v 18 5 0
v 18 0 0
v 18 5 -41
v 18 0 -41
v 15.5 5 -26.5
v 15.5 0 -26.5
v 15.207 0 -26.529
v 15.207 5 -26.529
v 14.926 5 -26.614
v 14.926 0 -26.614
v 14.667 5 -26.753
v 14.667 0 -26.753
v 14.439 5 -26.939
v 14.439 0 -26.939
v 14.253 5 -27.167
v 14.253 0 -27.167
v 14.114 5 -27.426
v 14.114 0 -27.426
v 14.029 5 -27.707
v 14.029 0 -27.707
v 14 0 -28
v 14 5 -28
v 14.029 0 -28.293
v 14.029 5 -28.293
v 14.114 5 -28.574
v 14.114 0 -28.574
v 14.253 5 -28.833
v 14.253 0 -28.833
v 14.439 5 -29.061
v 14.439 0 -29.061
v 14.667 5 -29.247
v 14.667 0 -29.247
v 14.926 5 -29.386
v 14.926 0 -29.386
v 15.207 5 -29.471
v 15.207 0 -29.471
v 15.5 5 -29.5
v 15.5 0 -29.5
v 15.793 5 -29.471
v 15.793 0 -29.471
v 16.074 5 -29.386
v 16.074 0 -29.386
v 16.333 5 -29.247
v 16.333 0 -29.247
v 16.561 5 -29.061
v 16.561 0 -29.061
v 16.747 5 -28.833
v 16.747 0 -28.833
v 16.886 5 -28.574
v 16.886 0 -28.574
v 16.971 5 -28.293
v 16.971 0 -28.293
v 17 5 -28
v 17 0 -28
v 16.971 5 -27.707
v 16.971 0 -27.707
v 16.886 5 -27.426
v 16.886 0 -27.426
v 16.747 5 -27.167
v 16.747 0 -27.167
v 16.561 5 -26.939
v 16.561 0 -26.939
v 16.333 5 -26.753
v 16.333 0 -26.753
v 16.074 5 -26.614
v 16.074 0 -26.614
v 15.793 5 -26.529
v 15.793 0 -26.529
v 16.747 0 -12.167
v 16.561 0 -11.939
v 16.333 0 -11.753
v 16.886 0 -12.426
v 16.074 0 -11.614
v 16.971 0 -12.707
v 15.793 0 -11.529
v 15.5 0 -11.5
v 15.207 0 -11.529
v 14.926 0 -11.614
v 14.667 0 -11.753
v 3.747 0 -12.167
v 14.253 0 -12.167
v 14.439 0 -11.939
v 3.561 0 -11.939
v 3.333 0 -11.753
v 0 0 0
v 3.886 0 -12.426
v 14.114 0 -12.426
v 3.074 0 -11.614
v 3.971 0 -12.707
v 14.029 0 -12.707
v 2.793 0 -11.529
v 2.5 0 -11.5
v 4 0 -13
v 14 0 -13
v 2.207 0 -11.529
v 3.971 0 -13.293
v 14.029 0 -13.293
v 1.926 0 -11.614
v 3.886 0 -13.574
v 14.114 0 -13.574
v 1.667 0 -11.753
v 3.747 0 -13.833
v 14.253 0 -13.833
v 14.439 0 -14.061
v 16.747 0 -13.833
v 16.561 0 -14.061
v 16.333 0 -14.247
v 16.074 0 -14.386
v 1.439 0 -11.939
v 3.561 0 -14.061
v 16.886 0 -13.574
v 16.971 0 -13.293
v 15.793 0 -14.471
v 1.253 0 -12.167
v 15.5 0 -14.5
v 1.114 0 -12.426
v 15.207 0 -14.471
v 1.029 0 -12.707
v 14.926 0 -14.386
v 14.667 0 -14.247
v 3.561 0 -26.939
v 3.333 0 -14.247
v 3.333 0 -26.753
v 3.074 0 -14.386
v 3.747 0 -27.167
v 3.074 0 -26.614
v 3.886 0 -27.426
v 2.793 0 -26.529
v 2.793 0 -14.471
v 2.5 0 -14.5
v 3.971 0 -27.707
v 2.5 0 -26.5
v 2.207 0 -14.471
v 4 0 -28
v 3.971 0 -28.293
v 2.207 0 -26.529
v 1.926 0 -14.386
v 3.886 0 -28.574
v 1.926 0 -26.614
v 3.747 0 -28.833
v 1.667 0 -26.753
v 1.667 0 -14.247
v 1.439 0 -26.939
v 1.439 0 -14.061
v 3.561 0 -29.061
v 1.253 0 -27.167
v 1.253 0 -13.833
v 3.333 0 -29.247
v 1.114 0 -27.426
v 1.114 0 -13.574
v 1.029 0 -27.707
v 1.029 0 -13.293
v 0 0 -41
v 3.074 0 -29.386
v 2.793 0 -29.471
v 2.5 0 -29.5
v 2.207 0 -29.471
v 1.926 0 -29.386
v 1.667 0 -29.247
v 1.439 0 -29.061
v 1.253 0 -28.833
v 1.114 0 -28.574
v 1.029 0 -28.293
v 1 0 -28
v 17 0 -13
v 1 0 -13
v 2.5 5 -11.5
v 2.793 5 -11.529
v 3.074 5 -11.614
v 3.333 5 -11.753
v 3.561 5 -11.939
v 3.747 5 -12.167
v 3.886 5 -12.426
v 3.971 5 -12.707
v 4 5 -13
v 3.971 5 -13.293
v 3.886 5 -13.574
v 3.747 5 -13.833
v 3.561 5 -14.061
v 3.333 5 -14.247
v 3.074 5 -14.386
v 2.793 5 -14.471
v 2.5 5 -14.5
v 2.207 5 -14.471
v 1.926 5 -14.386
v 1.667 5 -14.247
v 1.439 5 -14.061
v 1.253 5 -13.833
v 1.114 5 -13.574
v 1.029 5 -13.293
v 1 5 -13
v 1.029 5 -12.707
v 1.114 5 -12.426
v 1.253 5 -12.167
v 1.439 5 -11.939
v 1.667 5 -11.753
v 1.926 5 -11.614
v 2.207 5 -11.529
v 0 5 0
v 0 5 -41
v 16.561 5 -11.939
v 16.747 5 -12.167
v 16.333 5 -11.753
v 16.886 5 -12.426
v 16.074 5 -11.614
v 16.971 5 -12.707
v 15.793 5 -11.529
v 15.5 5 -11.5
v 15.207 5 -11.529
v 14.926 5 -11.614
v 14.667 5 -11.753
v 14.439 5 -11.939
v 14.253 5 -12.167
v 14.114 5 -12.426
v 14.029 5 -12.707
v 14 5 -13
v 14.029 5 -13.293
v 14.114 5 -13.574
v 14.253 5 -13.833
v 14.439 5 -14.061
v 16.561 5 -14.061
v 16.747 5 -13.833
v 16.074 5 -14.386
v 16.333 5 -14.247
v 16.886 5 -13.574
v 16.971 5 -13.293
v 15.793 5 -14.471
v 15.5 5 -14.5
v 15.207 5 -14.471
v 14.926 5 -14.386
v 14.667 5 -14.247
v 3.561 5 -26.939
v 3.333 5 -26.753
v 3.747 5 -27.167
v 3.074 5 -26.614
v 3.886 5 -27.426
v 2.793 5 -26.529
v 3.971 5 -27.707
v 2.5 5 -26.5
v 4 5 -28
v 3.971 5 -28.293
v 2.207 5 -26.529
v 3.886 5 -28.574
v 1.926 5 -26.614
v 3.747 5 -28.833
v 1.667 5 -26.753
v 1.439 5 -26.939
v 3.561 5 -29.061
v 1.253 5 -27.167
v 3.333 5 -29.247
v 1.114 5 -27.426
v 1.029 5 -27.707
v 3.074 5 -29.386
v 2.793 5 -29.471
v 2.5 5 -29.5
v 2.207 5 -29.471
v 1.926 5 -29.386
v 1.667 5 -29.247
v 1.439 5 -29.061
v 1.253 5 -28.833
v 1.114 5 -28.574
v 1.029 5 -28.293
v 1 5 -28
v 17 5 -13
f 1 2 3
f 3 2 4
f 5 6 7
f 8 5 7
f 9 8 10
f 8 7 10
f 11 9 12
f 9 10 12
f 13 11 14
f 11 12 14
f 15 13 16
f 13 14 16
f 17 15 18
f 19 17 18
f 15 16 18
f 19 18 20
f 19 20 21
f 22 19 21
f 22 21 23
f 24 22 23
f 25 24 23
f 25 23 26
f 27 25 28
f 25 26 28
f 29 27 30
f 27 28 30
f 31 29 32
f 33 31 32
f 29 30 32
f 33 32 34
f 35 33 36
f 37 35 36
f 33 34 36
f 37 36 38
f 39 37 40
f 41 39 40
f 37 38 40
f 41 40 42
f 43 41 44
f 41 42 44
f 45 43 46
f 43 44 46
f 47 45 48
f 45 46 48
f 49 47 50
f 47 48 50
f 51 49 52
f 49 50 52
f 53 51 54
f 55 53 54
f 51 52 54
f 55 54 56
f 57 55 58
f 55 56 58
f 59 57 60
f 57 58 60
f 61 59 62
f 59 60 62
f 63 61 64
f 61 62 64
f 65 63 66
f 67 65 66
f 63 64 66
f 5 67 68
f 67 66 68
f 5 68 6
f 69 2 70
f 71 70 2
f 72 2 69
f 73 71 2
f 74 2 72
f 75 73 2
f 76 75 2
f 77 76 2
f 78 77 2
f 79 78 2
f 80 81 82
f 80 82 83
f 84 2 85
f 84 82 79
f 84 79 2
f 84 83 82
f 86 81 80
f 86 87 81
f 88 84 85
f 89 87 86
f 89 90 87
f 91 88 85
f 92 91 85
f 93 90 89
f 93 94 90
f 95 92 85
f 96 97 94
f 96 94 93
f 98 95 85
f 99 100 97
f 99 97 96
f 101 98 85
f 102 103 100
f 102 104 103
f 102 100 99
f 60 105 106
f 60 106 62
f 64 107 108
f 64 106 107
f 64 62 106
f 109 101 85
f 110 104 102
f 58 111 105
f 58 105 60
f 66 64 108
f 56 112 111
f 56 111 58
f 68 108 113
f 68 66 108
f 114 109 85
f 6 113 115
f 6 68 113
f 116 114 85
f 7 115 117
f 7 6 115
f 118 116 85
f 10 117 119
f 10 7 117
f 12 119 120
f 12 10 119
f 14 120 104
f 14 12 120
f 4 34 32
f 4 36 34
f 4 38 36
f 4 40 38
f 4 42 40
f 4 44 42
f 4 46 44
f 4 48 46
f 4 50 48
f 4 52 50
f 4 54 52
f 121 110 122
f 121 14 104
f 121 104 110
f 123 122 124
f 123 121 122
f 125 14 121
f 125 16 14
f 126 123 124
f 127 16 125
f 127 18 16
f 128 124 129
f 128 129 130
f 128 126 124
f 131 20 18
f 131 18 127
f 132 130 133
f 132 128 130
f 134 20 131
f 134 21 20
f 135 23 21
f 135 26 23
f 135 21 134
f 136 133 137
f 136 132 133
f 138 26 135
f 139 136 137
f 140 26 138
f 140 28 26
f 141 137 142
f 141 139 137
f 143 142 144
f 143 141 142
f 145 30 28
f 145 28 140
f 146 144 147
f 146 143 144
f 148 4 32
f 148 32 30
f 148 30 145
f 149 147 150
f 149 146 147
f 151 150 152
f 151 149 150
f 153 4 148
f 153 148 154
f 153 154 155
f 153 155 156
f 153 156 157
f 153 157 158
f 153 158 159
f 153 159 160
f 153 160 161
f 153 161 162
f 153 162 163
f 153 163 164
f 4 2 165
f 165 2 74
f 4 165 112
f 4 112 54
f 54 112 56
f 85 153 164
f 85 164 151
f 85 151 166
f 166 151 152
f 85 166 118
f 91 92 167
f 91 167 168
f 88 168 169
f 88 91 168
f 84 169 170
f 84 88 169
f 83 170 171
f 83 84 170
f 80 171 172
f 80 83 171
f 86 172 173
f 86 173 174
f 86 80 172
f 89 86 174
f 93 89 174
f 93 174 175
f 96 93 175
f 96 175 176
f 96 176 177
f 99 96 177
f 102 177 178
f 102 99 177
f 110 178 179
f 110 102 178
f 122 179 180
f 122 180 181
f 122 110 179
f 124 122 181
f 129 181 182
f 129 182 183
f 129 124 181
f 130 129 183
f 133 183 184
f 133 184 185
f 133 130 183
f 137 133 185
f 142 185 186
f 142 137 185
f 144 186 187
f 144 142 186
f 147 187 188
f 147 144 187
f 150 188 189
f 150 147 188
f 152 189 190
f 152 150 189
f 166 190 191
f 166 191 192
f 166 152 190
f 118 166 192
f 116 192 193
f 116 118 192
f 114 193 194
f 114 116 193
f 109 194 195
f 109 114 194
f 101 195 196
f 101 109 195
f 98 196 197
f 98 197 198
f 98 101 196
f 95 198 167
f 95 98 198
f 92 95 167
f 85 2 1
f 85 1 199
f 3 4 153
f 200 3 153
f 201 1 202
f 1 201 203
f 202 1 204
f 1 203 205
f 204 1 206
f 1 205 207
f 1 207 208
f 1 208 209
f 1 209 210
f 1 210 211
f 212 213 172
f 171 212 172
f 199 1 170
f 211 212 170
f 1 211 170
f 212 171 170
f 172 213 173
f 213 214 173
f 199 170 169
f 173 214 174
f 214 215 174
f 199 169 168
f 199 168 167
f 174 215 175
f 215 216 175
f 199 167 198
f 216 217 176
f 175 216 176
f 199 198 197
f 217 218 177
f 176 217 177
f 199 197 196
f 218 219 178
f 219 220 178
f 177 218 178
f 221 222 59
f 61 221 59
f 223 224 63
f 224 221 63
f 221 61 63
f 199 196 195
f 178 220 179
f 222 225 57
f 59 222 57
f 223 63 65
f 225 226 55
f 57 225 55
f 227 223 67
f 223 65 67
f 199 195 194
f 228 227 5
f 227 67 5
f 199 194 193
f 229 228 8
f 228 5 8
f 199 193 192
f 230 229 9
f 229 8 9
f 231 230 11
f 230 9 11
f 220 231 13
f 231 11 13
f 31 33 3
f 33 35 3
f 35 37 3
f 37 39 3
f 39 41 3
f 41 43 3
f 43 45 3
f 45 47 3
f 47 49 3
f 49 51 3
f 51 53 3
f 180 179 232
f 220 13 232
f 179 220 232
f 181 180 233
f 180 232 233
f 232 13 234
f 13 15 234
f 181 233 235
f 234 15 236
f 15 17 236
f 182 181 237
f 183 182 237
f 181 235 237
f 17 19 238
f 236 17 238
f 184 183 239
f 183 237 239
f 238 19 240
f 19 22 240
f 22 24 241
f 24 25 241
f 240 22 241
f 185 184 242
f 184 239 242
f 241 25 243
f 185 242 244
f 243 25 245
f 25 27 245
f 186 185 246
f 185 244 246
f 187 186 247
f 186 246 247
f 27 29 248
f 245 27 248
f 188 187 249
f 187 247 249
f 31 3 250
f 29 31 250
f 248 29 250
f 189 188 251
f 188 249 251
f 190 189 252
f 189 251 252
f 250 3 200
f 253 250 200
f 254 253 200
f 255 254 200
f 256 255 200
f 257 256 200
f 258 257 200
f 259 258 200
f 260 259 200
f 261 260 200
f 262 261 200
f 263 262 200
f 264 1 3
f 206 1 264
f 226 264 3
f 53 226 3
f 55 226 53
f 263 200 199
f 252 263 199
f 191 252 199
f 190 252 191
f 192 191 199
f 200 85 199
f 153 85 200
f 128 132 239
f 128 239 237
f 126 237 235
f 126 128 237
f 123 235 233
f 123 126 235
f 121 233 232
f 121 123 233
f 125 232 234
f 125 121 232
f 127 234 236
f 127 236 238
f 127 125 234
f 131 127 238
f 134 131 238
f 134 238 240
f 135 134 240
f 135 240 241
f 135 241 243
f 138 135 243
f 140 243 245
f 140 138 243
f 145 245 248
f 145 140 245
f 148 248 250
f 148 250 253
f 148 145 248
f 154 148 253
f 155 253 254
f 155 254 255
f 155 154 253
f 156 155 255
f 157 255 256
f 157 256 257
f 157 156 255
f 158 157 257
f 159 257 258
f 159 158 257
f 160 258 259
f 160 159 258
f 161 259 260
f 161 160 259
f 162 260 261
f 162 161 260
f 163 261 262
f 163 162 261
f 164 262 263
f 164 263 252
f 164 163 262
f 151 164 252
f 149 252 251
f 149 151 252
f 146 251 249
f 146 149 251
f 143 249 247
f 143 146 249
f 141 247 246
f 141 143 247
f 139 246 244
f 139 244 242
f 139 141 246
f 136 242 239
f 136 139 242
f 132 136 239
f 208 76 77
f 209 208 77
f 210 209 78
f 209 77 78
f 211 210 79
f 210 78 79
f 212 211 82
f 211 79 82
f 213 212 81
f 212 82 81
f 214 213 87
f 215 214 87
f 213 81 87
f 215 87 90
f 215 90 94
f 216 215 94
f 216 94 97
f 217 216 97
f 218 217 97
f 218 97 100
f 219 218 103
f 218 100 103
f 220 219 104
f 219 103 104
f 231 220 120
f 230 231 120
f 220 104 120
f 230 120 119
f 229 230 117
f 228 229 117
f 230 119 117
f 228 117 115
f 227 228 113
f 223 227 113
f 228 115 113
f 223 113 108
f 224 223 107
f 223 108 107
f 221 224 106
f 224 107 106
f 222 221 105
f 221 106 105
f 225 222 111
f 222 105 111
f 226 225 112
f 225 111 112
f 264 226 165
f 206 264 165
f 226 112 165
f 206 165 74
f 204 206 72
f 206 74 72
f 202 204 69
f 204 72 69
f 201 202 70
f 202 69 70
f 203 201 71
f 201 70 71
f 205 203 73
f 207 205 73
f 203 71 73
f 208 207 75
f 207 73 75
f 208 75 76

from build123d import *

# Parameters (mm, degrees)
SKETCH1_W           = 9
SKETCH1_H           = 41
SKETCH1_R           = 1.5
BOSS_EXTRUDE1_DEPTH = 5


with BuildPart() as part:
    # Sketch1 → Boss-Extrude1 (new body)
    with BuildSketch(Plane(origin=(0, 0, 0), x_dir=(1, 0, 0), z_dir=(0, 1, 0))):
        with Locations((4.5, 20.5)):
            Rectangle(SKETCH1_W, SKETCH1_H)
        with Locations(Location((2.5, 13, 0), (0, 0, 270))):
            Circle(SKETCH1_R, mode=Mode.SUBTRACT)
        with Locations(Location((2.5, 28, 0), (0, 0, 270))):
            Circle(SKETCH1_R, mode=Mode.SUBTRACT)
    boss_extrude1 = extrude(amount=BOSS_EXTRUDE1_DEPTH)

    # Mirror1: Boss-Extrude1 across plane
    add(boss_extrude1.mirror(Plane(origin=(9, 5, 0), x_dir=(0, 0, 1), z_dir=(-1, 0, 0))))


solid = part.part
